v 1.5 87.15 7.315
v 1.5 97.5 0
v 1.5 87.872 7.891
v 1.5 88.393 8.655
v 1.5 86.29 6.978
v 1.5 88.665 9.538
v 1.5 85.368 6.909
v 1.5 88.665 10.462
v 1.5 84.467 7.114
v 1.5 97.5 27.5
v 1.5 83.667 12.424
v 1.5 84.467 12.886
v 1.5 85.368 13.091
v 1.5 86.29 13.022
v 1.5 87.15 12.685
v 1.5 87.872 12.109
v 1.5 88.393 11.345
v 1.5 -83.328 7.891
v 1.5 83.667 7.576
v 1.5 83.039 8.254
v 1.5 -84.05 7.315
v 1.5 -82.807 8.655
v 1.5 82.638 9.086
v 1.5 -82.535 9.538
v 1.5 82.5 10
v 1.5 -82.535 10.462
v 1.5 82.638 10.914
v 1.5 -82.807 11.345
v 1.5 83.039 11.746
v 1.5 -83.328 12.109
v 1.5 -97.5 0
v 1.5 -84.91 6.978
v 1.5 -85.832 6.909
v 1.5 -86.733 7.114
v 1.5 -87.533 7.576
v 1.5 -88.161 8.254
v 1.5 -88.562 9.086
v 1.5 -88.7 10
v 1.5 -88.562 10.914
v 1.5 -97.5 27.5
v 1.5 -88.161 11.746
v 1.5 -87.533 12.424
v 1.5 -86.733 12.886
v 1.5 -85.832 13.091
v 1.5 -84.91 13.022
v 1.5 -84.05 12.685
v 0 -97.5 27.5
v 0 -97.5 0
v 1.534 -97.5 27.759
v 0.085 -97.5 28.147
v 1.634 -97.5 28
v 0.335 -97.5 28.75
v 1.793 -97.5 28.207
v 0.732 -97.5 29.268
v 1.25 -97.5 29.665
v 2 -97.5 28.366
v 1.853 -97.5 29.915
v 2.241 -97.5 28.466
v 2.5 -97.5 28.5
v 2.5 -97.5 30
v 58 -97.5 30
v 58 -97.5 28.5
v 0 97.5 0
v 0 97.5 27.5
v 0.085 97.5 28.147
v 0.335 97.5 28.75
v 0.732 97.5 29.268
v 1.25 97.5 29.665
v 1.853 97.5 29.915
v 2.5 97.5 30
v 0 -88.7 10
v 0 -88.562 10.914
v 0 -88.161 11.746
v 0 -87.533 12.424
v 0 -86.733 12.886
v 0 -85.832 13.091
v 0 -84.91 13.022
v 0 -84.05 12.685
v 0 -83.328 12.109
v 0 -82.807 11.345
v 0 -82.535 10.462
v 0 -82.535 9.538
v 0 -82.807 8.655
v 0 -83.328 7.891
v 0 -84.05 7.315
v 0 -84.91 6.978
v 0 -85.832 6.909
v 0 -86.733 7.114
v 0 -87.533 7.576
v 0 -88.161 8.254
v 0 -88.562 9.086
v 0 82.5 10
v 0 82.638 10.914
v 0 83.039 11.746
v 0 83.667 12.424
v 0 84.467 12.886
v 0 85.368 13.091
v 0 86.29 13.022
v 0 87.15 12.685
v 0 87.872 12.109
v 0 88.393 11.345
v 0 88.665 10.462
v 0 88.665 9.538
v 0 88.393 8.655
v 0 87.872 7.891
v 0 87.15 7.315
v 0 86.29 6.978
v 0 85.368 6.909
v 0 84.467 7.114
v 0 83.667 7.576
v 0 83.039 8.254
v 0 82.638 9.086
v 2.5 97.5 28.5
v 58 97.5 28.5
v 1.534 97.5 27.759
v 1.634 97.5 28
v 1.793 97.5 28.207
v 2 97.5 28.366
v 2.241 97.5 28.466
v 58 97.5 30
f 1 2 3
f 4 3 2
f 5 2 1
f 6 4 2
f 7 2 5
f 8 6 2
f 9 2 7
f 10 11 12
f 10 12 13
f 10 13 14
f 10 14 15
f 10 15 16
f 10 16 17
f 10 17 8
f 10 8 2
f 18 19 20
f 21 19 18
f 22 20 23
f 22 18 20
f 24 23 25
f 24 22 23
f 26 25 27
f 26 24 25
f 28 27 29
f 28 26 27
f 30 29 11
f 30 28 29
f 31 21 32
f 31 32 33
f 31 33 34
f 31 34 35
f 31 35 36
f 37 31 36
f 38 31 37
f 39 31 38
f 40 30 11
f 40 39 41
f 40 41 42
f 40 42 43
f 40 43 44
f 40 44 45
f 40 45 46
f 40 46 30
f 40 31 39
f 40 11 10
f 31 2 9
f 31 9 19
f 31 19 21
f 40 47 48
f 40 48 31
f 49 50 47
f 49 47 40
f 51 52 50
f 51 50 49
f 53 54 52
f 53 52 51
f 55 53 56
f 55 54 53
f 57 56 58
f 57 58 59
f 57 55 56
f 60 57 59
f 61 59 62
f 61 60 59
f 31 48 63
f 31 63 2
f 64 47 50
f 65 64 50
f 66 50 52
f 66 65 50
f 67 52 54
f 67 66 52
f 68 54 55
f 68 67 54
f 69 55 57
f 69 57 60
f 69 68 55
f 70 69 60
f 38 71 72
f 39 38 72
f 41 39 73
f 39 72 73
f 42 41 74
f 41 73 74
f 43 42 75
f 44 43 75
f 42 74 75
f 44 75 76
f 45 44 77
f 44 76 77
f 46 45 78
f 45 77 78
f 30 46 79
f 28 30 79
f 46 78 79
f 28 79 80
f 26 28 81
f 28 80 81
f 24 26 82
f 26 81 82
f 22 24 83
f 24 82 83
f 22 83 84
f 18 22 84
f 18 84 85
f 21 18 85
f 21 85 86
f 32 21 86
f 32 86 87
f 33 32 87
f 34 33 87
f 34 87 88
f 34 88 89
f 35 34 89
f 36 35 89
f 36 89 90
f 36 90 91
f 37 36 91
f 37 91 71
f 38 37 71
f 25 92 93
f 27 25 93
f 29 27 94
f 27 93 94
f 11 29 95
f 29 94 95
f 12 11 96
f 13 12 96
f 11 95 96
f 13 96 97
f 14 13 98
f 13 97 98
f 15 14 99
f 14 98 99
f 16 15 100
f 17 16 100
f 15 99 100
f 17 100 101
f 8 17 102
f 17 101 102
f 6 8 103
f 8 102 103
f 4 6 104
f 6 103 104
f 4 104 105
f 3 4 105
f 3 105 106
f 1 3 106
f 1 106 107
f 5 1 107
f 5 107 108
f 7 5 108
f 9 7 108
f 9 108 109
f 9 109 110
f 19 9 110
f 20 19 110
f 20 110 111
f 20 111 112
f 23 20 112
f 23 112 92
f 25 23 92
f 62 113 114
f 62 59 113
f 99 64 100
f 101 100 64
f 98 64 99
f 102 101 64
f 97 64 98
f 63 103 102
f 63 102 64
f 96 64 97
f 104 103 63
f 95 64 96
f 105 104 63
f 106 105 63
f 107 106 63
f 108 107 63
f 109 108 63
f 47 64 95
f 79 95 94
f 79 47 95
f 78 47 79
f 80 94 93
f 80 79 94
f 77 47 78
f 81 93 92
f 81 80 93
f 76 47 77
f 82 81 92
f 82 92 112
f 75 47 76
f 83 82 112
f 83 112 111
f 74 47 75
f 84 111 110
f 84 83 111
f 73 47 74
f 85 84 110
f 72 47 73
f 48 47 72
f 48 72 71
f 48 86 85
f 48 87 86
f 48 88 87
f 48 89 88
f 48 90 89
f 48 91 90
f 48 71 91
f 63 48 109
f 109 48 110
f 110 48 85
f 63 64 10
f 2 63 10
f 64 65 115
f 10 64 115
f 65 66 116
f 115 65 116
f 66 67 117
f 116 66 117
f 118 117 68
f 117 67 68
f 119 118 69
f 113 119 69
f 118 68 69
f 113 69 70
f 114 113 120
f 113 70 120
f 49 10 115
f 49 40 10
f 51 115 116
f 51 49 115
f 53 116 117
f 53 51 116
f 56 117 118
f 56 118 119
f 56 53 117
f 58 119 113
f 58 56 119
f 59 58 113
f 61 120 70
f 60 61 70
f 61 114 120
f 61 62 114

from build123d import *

# Parameters (mm, degrees)
F1_DEPTH = 97.5
F2_R     = 3.1
F3_DEPTH = 25
F4_R     = 2.5
F5_R     = 1


with BuildPart() as f1:
    # F0 (on Front) → F1 (new body, symmetric)
    with BuildSketch(Plane.XZ):
        Polygon((0, 30), (0, 0), (1.5, 0), (1.5, 28.5), (58, 28.5), (58, 30), align=None)
    extrude(amount=F1_DEPTH, both=True)

    # F2 (on face) → F3 (cut)
    with BuildSketch(Plane(origin=(0, 0, 0), x_dir=(0, -1, 0), z_dir=(-1, 0, 0))):
        with Locations((-85.6, 10)):
            Circle(F2_R)
        with Locations((85.6, 10)):
            Circle(F2_R)
    extrude(amount=-F3_DEPTH, mode=Mode.SUBTRACT)

    # F4
    f4_edges = [f1.edges().sort_by_distance(p)[0] for p in [
        (0, 0, 30),
    ]]
    fillet(f4_edges, radius=F4_R)

    # F5
    f5_edges = [f1.edges().sort_by_distance(p)[0] for p in [
        (1.5, 0, 28.5),
    ]]
    fillet(f5_edges, radius=F5_R)


solid = f1.part
